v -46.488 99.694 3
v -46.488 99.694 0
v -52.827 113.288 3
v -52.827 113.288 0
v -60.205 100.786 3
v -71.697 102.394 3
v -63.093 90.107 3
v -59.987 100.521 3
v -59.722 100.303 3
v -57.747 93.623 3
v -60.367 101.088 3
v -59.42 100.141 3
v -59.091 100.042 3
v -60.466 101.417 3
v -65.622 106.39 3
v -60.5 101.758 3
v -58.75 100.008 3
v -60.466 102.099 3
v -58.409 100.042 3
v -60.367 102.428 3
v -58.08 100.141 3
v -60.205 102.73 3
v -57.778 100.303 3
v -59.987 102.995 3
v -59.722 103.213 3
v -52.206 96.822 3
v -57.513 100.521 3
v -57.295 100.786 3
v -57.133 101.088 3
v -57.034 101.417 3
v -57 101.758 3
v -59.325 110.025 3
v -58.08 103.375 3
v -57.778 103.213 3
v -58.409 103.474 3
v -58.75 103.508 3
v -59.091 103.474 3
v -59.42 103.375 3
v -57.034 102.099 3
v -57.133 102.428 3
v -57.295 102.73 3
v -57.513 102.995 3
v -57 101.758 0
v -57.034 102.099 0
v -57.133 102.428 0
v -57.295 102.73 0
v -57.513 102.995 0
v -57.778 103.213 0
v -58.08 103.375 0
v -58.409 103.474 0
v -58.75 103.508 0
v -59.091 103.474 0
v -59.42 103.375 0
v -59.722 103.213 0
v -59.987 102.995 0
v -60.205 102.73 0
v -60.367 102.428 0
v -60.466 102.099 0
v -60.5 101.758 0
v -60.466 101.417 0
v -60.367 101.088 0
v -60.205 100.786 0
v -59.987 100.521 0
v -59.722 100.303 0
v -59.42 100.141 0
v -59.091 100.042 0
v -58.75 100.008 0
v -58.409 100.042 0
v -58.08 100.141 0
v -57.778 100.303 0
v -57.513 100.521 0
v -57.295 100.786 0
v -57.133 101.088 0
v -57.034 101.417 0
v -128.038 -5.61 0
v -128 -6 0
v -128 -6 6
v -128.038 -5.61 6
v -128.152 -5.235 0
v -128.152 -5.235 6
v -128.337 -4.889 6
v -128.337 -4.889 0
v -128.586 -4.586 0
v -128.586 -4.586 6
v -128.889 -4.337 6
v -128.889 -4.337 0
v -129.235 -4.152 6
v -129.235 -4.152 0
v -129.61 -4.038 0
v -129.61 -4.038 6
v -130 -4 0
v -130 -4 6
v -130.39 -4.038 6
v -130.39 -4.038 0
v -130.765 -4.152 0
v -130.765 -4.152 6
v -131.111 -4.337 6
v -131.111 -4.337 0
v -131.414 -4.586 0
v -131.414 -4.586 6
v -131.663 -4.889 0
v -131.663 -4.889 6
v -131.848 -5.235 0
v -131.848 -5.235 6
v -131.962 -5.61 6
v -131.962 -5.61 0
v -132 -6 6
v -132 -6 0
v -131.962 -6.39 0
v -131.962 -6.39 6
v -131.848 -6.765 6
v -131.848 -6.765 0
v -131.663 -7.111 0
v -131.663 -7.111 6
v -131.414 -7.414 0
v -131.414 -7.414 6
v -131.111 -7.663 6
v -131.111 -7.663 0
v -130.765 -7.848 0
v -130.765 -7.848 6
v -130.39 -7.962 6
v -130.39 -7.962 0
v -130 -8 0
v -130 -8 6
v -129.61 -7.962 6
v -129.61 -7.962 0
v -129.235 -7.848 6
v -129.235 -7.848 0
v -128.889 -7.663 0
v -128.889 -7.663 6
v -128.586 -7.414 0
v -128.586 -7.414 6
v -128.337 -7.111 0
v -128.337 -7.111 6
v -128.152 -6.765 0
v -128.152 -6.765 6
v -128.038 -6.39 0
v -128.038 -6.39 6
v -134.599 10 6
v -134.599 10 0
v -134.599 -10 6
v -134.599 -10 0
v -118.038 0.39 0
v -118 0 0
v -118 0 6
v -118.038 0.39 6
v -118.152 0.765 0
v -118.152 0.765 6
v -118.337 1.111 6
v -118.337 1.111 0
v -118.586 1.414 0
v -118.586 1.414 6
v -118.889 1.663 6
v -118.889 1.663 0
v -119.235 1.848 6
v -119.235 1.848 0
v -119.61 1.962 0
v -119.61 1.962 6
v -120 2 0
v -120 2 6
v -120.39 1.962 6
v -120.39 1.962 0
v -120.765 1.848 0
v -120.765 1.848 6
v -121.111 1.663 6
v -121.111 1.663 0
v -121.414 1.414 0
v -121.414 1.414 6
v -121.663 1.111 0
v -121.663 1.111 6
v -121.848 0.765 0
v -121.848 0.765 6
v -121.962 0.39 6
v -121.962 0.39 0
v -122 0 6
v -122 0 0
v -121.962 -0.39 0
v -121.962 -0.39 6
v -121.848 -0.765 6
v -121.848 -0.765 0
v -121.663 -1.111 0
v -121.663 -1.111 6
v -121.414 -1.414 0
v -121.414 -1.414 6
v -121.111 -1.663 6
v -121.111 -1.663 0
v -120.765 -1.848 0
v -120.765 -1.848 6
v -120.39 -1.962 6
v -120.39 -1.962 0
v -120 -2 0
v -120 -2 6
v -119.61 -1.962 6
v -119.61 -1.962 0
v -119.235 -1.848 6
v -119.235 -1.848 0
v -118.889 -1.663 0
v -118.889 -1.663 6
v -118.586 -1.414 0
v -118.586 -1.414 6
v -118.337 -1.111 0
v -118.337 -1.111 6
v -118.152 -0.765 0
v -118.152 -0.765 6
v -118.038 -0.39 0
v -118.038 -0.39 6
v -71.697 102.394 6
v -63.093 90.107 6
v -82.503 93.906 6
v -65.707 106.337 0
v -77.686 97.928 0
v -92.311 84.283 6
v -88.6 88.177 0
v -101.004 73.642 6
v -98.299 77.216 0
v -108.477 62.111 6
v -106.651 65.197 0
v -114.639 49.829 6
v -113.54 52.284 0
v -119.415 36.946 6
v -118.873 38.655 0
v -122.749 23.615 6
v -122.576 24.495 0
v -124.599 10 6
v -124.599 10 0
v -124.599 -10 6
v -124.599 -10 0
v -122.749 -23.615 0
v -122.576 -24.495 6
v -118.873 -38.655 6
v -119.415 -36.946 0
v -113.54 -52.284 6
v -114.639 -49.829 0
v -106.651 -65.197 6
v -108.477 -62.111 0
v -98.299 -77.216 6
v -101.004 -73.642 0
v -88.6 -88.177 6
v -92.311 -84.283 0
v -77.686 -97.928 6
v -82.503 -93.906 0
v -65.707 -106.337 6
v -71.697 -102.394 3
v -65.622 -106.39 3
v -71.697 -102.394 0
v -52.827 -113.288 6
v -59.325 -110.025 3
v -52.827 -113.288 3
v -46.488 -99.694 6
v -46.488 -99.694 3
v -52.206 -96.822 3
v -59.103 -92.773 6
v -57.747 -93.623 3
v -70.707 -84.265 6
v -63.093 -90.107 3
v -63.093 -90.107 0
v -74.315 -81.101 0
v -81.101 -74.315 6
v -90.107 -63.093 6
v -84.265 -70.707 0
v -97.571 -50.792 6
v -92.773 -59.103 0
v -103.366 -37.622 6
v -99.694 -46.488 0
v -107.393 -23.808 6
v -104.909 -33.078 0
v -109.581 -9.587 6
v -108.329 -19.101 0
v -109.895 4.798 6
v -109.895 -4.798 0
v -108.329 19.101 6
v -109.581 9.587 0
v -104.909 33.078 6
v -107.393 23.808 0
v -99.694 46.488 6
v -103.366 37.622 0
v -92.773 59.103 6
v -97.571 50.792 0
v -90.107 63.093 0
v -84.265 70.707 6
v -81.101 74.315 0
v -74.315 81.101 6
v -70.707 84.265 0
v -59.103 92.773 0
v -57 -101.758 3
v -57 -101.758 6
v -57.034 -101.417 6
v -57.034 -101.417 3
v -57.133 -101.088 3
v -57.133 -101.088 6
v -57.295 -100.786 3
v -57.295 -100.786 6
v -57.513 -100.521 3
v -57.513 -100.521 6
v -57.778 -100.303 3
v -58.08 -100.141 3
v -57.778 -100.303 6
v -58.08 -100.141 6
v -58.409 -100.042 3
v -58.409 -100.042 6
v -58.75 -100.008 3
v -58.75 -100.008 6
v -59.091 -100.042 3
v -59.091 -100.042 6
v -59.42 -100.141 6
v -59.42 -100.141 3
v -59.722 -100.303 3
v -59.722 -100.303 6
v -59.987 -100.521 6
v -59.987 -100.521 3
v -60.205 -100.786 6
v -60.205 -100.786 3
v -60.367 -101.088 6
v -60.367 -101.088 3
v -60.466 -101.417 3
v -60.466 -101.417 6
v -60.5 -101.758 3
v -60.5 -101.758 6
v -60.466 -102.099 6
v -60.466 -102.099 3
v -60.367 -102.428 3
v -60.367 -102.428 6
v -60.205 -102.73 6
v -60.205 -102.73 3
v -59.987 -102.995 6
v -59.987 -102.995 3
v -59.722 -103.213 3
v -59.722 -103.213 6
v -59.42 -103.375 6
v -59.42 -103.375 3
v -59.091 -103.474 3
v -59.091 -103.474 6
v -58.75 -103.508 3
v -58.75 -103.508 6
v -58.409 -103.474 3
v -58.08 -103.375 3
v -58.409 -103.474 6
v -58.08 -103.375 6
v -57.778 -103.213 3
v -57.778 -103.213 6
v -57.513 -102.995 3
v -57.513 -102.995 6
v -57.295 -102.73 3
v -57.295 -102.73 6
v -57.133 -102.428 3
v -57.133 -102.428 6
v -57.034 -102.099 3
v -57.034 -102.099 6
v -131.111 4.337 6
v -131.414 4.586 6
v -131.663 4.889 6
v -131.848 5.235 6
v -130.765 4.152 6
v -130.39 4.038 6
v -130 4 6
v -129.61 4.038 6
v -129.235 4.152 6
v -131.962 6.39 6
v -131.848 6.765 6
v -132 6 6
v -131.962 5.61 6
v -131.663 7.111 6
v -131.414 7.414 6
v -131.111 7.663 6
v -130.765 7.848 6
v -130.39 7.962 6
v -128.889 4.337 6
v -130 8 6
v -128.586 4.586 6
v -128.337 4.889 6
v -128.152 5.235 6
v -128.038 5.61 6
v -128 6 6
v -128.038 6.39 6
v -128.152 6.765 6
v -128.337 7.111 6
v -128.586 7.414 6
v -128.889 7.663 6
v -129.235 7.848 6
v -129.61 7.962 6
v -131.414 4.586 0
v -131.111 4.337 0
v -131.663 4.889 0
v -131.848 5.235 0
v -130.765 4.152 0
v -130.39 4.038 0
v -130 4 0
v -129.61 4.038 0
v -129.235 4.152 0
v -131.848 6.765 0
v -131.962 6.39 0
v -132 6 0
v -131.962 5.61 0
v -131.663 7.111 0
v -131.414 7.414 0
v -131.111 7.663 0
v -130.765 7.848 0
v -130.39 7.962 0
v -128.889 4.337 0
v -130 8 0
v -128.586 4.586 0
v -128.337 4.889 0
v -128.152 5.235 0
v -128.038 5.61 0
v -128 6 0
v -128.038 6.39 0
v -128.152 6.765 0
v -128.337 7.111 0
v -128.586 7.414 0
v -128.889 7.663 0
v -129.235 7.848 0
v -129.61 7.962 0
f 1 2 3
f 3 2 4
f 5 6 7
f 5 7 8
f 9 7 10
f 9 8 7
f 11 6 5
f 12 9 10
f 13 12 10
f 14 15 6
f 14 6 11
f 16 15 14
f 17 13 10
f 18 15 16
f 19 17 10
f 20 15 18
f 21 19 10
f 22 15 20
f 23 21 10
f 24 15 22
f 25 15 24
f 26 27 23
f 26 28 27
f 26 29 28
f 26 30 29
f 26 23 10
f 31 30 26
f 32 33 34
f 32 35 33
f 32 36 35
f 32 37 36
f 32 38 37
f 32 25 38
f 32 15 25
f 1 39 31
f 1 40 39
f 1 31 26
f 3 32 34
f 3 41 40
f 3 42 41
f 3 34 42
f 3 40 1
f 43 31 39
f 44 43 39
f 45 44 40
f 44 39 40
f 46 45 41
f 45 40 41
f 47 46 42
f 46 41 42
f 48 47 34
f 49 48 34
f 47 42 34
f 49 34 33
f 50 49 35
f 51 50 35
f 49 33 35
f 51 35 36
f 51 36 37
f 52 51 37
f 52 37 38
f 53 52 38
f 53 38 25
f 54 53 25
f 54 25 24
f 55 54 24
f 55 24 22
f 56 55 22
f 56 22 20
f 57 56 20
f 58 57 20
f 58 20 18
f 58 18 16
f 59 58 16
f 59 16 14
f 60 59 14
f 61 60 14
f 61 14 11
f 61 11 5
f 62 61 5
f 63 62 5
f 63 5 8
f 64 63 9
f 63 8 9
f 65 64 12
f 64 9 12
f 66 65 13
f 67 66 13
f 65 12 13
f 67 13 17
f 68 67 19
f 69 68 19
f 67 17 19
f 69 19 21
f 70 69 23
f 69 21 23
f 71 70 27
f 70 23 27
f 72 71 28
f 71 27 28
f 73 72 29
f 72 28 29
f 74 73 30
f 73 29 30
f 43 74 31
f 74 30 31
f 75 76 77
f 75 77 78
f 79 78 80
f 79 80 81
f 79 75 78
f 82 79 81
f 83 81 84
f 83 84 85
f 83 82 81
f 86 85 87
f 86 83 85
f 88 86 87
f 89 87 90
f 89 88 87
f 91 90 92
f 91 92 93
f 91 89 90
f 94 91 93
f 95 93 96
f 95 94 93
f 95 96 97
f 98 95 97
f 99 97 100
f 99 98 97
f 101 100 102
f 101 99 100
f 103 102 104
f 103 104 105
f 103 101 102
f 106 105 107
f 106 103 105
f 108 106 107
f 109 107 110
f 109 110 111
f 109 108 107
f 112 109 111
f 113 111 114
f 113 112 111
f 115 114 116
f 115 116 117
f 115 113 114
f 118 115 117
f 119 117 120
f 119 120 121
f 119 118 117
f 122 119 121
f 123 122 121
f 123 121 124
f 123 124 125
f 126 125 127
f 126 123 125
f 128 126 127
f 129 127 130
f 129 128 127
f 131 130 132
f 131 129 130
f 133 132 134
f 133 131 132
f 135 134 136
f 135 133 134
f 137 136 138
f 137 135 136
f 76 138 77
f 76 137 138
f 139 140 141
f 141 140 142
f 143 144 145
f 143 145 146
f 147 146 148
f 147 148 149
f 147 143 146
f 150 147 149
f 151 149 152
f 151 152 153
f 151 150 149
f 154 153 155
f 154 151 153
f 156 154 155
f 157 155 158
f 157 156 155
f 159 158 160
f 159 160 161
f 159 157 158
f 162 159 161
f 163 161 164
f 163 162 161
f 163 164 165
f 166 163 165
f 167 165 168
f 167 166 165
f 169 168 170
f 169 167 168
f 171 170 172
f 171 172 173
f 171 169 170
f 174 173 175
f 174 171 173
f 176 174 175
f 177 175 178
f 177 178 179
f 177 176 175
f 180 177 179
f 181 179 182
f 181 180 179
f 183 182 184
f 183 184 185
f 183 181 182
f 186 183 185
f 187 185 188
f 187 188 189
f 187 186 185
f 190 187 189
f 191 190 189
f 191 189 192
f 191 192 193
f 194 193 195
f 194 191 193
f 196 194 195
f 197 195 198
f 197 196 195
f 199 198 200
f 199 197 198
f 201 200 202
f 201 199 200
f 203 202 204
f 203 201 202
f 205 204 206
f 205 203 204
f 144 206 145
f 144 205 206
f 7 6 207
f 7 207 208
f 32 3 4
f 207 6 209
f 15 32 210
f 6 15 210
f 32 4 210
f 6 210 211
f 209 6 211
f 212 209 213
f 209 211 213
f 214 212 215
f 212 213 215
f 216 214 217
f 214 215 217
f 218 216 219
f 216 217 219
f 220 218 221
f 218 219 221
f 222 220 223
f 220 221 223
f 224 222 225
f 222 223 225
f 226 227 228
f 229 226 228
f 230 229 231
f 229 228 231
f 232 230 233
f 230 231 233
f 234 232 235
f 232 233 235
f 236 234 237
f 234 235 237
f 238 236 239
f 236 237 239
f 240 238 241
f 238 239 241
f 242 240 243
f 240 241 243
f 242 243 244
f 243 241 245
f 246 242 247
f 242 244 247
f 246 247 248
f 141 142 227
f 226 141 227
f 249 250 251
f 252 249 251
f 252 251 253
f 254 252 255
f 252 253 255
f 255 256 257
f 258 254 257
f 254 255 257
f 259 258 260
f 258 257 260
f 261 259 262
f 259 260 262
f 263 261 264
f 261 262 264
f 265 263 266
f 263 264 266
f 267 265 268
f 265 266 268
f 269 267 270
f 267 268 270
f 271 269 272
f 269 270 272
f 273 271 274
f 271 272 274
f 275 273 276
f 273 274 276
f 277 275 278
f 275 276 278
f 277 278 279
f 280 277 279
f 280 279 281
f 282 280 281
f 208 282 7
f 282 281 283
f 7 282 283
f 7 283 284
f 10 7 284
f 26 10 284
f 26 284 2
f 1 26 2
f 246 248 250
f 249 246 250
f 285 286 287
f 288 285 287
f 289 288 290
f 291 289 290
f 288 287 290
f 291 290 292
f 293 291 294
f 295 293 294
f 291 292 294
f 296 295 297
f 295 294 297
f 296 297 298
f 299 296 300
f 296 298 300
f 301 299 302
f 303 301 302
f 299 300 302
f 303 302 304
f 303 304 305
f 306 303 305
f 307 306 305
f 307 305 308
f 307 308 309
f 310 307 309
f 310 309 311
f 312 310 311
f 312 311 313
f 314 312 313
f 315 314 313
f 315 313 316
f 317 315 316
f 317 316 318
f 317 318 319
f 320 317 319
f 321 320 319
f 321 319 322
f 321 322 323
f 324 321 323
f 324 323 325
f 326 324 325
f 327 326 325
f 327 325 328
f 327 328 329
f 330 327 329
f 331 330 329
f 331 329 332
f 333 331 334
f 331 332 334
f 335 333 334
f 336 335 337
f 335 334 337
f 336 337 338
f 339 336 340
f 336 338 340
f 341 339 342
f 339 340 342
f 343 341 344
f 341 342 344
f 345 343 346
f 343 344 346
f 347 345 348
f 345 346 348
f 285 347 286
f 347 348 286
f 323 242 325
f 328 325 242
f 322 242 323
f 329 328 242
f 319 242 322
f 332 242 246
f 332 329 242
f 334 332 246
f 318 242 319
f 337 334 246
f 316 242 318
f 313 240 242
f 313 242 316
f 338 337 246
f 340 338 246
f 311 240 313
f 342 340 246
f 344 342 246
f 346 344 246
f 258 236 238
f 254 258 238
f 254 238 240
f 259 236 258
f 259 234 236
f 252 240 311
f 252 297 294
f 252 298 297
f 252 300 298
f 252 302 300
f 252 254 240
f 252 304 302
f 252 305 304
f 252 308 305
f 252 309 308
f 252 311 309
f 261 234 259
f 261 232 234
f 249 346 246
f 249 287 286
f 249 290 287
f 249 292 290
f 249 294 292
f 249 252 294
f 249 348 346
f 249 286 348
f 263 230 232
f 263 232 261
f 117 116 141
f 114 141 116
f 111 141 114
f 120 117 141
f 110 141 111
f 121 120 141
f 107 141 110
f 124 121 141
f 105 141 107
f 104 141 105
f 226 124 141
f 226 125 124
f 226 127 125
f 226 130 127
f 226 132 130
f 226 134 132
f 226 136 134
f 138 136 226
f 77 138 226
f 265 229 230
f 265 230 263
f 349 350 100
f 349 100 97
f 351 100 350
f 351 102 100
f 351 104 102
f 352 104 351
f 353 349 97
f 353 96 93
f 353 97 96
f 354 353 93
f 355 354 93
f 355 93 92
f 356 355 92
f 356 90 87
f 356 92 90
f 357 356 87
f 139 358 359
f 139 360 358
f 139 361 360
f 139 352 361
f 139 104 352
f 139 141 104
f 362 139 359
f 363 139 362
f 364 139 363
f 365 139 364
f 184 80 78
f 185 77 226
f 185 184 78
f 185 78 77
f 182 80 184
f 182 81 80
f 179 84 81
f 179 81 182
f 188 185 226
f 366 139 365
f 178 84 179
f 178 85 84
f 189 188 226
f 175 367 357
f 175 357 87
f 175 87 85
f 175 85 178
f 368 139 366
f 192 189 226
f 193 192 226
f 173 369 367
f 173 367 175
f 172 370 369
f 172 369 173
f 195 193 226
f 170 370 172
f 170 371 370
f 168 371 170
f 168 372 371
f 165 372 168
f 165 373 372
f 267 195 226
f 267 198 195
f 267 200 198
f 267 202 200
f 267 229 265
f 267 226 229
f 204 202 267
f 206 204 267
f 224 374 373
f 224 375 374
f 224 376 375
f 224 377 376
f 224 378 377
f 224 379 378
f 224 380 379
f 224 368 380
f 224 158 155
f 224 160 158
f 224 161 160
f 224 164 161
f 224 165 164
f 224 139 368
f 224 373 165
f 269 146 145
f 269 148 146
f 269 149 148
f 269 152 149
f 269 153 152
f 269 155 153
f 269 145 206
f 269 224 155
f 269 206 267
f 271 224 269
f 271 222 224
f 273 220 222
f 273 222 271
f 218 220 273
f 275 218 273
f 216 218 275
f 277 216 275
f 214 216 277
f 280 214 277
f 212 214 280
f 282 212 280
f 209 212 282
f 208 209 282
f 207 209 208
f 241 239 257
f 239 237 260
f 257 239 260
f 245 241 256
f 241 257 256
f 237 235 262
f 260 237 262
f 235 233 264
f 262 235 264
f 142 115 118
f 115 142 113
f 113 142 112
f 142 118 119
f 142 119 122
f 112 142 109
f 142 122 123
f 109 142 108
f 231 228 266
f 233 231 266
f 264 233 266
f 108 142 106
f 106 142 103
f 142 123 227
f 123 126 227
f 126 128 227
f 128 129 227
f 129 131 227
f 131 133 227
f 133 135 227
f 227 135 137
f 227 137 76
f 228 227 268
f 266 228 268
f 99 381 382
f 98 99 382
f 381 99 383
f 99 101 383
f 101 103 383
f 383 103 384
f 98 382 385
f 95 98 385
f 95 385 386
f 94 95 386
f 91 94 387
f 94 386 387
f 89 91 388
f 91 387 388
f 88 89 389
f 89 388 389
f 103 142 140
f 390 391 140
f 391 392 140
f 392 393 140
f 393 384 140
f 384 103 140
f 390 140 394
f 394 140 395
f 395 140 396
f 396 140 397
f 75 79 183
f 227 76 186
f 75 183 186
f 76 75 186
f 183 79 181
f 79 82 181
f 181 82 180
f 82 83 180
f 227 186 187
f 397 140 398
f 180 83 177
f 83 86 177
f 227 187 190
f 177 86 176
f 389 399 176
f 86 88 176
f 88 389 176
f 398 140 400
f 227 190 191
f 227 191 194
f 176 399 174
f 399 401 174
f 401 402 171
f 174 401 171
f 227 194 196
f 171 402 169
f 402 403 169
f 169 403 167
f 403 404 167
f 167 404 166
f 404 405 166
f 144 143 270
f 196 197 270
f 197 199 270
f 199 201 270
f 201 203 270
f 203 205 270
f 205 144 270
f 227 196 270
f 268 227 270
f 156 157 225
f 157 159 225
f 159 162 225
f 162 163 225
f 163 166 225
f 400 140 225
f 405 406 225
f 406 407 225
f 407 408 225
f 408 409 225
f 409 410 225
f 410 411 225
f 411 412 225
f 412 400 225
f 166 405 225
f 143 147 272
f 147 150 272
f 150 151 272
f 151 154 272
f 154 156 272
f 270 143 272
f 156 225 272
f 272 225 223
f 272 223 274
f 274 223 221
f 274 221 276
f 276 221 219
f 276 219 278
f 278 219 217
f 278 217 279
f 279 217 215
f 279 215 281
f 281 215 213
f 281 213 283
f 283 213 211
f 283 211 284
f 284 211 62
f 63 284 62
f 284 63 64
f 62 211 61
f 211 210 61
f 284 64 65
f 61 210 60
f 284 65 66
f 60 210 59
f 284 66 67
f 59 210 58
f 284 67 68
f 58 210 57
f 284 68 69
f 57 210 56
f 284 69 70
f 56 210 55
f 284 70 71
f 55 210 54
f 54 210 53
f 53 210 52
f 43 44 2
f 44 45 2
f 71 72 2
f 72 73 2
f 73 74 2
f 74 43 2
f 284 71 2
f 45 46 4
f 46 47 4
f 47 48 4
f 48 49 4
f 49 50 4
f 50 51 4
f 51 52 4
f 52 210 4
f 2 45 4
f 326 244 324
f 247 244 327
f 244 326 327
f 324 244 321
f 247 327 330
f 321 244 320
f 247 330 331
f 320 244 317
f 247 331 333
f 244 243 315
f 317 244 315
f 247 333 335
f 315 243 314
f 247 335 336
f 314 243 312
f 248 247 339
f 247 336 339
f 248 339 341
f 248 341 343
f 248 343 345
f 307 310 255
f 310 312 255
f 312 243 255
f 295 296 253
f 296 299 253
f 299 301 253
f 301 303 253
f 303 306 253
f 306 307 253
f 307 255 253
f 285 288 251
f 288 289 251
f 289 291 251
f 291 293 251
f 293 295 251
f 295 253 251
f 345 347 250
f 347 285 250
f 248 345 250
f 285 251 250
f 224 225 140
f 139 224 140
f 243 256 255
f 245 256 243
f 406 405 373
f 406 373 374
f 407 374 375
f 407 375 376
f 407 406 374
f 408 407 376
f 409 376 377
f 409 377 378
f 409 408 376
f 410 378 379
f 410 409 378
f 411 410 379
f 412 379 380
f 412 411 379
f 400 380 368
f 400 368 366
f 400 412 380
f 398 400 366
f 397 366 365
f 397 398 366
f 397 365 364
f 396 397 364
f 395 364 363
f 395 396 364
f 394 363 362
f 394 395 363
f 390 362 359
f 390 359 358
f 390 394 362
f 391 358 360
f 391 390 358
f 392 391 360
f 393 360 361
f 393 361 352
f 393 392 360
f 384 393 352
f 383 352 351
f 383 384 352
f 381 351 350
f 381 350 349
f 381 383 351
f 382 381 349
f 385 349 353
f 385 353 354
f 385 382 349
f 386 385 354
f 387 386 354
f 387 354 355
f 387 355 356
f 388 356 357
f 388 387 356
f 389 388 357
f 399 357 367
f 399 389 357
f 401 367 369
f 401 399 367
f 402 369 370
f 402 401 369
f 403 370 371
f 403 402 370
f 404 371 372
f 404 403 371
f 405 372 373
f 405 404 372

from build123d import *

# Parameters (mm, degrees)
ESQUISSE1_R             = 2
BOSS_EXTRU_1_DEPTH      = 6
ESQUISSE3_R             = 1.75
ENL_V_MAT_EXTRU_1_DEPTH = 10
ENL_V_START             = -3
ENL_V_MAT_EXTRU_2_DEPTH = 3
ENL_V_MAT_EXTRU_3_DEPTH = 3


with BuildPart() as part:
    # Esquisse1 → Boss.-Extru.1 (new body)
    with BuildSketch(Plane.XY):
        with BuildLine():
            Line((-134.599357944, -10), (-124.599357944, -10))
            ThreePointArc((-124.599357944, -10), (-102.650769054, -71.328953537), (-52.827282718, -113.28847338))
            Line((-52.827282718, -113.28847338), (-46.488008791, -99.693856574))
            ThreePointArc((-46.488008791, -99.693856574), (-110, 0), (-46.488008791, 99.693856574))
            Line((-46.488008791, 99.693856574), (-52.827282718, 113.28847338))
            ThreePointArc((-52.827282718, 113.28847338), (-102.650769054, 71.328953537), (-124.599357944, 10))
            Line((-124.599357944, 10), (-134.599357944, 10))
            Line((-134.599357944, 10), (-134.599357944, -10))
        make_face()
        with Locations((-120, 0)):
            Circle(ESQUISSE1_R, mode=Mode.SUBTRACT)
        with Locations((-130, 6)):
            Circle(ESQUISSE1_R, mode=Mode.SUBTRACT)
        with Locations((-130, -6)):
            Circle(ESQUISSE1_R, mode=Mode.SUBTRACT)
    extrude(amount=BOSS_EXTRU_1_DEPTH)

    # Esquisse3 → Enlèv. mat.-Extru.1 (cut)
    with BuildSketch(Plane.XY.offset(6)):
        with Locations((-58.75, 101.757984945)):
            Circle(ESQUISSE3_R)
        with Locations((-58.75, -101.757984945)):
            Circle(ESQUISSE3_R)
    extrude(amount=-ENL_V_MAT_EXTRU_1_DEPTH, mode=Mode.SUBTRACT)

    # Esquisse4 → Enlèv. mat.-Extru.2 (cut)
    with BuildSketch(Plane.XY.offset(6).offset(ENL_V_START)):
        with BuildLine():
            Line((-71.697054544, 102.394005536), (-63.093407999, 90.106724872))
            ThreePointArc((-63.093407999, 90.106724872), (-55, 95.262794416), (-46.488008791, 99.693856574))
            Line((-46.488008791, 99.693856574), (-52.827282718, 113.28847338))
            ThreePointArc((-52.827282718, 113.28847338), (-62.5, 108.253175473), (-71.697054544, 102.394005536))
        make_face()
    extrude(amount=ENL_V_MAT_EXTRU_2_DEPTH, mode=Mode.SUBTRACT)

    # Esquisse6 → Enlèv. mat.-Extru.3 (cut)
    with BuildSketch(Plane(origin=(0, 0, 0), x_dir=(-1, 0, 0), z_dir=(0, 0, -1))):
        with BuildLine():
            Line((63.093407999, -90.106724872), (71.697054544, -102.394005536))
            ThreePointArc((71.697054544, -102.394005536), (62.5, -108.253175473), (52.827282718, -113.28847338))
            Line((52.827282718, -113.28847338), (46.488008791, -99.693856574))
            ThreePointArc((46.488008791, -99.693856574), (55, -95.262794416), (63.093407999, -90.106724872))
        make_face()
    extrude(amount=-ENL_V_MAT_EXTRU_3_DEPTH, mode=Mode.SUBTRACT)


solid = part.part
